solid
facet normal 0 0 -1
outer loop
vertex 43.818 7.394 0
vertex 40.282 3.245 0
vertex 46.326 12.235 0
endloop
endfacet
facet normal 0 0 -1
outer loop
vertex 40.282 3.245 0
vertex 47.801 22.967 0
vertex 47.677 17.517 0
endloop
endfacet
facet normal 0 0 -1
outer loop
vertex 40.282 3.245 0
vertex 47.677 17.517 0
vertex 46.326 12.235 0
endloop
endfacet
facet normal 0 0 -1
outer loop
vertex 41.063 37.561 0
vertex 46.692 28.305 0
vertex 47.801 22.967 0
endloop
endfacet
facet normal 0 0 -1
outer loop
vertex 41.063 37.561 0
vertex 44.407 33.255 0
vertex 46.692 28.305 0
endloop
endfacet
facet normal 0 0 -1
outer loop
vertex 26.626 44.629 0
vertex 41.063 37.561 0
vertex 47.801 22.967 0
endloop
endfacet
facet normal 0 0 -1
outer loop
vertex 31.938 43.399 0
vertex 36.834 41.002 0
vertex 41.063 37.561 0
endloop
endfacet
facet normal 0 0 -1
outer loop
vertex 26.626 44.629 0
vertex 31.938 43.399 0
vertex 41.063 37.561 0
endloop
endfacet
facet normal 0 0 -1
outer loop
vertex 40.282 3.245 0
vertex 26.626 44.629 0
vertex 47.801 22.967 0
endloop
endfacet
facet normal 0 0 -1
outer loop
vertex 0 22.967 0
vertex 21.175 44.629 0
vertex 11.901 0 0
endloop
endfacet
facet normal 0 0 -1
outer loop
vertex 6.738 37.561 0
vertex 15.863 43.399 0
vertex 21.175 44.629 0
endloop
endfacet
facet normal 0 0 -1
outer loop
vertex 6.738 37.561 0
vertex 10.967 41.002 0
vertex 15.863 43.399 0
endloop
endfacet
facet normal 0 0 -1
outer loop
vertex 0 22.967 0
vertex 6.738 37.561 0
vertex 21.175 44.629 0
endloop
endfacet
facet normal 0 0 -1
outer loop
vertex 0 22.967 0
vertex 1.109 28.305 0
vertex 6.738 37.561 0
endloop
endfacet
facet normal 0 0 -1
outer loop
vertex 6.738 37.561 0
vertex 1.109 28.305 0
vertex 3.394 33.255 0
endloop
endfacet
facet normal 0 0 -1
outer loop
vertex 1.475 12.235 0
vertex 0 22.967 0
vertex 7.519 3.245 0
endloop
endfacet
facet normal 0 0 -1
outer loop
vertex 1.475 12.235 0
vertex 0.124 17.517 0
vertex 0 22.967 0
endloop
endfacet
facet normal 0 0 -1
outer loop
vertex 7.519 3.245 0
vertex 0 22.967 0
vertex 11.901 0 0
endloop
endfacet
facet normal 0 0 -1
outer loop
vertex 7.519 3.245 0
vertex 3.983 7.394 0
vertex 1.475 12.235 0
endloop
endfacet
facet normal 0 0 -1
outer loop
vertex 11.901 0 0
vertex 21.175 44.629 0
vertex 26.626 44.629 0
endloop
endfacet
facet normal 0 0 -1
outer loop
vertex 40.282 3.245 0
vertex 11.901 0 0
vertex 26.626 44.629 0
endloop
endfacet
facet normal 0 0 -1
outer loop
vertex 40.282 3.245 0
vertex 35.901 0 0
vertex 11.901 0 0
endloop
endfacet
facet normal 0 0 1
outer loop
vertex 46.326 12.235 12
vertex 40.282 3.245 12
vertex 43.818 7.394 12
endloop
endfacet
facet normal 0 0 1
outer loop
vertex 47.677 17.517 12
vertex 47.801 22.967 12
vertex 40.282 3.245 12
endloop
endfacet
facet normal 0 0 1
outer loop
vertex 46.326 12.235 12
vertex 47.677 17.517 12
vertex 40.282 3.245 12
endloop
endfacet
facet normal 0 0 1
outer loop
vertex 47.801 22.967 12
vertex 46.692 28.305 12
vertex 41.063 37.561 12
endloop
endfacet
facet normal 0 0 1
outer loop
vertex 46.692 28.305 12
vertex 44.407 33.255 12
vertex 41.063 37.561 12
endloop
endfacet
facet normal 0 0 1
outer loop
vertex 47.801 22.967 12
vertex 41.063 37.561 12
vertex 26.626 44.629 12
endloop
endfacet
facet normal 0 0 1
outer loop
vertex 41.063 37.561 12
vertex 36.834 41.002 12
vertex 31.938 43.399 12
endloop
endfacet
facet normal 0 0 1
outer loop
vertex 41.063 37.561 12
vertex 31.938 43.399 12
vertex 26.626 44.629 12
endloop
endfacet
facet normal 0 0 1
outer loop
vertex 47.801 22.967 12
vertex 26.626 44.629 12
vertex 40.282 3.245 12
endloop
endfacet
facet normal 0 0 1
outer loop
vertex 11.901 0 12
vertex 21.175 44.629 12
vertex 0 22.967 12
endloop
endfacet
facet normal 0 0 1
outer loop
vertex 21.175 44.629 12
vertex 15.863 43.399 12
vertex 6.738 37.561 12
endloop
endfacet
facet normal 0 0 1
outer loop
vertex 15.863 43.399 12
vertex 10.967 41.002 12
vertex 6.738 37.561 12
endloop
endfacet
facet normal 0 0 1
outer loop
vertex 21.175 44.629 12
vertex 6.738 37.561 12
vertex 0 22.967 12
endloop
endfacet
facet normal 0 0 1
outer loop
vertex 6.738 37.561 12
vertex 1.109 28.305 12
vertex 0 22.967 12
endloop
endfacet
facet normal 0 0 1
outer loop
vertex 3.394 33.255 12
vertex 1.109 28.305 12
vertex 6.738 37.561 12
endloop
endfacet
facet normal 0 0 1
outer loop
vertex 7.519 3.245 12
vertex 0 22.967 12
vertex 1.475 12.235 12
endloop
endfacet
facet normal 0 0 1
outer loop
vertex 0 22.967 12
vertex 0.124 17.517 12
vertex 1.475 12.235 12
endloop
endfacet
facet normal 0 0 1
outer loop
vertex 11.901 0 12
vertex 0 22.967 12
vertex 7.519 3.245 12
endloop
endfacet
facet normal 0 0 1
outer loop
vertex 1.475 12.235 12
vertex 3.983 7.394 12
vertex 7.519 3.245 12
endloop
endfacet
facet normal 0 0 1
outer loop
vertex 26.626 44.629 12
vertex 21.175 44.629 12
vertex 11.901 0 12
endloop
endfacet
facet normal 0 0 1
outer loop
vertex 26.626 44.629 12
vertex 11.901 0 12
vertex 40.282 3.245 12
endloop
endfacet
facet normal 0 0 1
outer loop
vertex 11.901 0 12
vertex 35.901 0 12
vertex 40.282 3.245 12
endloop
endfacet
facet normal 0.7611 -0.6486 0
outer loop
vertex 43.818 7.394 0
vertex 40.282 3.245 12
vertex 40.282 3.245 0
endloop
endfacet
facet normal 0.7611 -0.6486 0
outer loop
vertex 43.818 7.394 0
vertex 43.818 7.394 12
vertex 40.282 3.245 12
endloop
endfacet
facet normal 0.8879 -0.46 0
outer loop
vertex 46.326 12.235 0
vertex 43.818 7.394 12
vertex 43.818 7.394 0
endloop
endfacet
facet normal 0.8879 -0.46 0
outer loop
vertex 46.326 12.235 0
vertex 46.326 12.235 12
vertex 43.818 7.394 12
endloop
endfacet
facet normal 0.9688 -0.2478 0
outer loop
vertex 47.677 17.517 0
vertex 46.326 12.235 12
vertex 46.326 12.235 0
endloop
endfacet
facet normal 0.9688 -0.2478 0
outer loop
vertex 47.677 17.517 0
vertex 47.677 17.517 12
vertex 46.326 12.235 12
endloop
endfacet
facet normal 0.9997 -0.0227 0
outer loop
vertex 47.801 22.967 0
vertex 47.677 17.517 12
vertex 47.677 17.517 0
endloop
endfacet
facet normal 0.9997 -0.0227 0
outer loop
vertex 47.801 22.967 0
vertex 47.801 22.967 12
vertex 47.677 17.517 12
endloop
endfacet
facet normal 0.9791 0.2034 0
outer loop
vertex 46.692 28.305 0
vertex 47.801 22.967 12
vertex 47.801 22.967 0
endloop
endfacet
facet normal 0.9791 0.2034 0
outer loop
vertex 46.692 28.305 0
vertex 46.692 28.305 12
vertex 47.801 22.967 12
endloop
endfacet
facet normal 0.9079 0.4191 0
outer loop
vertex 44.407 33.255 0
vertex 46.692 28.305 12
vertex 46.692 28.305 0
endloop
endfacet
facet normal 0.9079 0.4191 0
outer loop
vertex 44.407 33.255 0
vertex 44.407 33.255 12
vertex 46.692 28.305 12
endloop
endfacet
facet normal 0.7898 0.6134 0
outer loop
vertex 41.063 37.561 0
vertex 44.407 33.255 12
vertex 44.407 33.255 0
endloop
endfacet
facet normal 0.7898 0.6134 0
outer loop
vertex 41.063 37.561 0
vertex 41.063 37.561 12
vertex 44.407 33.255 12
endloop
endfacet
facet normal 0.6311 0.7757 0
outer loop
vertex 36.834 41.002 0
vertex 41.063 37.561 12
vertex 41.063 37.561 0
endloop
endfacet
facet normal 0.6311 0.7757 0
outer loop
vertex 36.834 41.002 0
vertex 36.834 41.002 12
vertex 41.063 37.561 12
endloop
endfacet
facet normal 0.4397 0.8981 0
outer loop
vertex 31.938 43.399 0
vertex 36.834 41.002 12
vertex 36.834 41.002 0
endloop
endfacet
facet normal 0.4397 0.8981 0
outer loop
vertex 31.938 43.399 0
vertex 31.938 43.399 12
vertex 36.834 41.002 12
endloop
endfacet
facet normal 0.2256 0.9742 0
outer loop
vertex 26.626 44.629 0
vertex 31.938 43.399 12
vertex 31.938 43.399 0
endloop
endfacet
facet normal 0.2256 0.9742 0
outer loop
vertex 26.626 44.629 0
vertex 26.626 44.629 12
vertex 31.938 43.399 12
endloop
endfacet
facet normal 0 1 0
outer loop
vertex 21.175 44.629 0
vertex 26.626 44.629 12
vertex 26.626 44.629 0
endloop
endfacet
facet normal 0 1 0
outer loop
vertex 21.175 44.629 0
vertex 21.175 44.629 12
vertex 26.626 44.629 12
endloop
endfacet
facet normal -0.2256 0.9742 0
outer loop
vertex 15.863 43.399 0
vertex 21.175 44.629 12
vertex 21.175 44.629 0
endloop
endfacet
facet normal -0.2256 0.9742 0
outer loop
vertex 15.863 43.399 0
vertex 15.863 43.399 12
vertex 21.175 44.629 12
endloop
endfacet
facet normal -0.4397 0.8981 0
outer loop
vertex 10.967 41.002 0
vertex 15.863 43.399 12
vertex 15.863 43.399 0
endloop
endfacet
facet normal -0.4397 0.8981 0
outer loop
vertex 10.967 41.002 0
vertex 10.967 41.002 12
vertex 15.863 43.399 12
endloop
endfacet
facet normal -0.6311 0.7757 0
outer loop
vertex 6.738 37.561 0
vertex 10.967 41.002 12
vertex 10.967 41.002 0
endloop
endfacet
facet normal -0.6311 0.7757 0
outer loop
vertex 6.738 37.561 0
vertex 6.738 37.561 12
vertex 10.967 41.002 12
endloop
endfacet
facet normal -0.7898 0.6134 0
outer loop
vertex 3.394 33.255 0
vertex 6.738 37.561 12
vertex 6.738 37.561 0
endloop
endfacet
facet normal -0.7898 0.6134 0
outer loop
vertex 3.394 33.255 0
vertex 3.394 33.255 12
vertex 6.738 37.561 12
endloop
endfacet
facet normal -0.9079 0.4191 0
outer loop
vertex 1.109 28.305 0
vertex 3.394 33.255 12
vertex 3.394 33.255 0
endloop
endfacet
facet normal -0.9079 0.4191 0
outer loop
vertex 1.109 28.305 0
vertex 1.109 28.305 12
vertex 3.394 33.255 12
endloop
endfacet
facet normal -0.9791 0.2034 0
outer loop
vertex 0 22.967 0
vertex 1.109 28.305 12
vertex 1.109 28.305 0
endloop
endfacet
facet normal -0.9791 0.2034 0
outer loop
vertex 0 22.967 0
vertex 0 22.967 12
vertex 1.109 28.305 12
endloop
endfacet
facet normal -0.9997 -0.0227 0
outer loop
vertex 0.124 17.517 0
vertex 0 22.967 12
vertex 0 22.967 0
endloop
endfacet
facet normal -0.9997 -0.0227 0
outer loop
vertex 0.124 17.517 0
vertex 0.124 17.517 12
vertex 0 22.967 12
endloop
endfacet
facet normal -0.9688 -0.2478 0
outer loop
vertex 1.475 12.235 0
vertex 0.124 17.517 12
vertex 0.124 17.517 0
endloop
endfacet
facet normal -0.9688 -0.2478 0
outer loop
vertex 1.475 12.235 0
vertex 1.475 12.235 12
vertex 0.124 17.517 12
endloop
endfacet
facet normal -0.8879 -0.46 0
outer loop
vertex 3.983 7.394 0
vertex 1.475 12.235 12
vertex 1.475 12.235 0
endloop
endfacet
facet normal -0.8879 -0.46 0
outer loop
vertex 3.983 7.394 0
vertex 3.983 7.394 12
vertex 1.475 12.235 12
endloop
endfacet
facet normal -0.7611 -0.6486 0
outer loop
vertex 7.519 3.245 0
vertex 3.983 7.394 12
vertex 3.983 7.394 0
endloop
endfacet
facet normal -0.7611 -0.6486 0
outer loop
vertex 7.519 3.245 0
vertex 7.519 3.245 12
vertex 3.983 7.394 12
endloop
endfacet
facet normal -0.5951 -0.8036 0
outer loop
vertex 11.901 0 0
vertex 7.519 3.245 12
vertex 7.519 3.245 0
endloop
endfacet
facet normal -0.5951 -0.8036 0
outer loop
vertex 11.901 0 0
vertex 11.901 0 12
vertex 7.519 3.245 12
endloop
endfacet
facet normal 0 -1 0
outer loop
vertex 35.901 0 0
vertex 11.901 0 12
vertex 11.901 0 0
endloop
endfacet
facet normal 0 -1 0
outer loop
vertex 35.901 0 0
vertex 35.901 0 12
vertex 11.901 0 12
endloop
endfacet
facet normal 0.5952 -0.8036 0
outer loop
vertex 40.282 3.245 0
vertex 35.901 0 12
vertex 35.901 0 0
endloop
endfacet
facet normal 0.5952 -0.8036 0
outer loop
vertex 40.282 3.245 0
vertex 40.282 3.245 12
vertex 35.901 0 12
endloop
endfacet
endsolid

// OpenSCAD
$fn = 32;

// ----------------------------------------------------------------------
// Flat adaptor: single_d, 12 mm thick
// ----------------------------------------------------------------------

// --- parameters (mm) ---
profile_height = 12;      // extrusion height
profile_points = 24;      // points of the closed outline

profile = [[35.901, 0], [40.282, 3.245], [43.818, 7.394], [46.326, 12.235], [47.677, 17.517], [47.801, 22.967], [46.692, 28.305], [44.407, 33.255], [41.063, 37.561], [36.834, 41.002], [31.938, 43.399], [26.626, 44.629], [21.175, 44.629], [15.863, 43.399], [10.967, 41.002], [6.738, 37.561], [3.394, 33.255], [1.109, 28.305], [0, 22.967], [0.124, 17.517], [1.475, 12.235], [3.983, 7.394], [7.519, 3.245], [11.901, 0]];  // single closed polygon, 24 points, counter clockwise

// --- the one profile operation ---
linear_extrude(height = profile_height) polygon(points = profile);
